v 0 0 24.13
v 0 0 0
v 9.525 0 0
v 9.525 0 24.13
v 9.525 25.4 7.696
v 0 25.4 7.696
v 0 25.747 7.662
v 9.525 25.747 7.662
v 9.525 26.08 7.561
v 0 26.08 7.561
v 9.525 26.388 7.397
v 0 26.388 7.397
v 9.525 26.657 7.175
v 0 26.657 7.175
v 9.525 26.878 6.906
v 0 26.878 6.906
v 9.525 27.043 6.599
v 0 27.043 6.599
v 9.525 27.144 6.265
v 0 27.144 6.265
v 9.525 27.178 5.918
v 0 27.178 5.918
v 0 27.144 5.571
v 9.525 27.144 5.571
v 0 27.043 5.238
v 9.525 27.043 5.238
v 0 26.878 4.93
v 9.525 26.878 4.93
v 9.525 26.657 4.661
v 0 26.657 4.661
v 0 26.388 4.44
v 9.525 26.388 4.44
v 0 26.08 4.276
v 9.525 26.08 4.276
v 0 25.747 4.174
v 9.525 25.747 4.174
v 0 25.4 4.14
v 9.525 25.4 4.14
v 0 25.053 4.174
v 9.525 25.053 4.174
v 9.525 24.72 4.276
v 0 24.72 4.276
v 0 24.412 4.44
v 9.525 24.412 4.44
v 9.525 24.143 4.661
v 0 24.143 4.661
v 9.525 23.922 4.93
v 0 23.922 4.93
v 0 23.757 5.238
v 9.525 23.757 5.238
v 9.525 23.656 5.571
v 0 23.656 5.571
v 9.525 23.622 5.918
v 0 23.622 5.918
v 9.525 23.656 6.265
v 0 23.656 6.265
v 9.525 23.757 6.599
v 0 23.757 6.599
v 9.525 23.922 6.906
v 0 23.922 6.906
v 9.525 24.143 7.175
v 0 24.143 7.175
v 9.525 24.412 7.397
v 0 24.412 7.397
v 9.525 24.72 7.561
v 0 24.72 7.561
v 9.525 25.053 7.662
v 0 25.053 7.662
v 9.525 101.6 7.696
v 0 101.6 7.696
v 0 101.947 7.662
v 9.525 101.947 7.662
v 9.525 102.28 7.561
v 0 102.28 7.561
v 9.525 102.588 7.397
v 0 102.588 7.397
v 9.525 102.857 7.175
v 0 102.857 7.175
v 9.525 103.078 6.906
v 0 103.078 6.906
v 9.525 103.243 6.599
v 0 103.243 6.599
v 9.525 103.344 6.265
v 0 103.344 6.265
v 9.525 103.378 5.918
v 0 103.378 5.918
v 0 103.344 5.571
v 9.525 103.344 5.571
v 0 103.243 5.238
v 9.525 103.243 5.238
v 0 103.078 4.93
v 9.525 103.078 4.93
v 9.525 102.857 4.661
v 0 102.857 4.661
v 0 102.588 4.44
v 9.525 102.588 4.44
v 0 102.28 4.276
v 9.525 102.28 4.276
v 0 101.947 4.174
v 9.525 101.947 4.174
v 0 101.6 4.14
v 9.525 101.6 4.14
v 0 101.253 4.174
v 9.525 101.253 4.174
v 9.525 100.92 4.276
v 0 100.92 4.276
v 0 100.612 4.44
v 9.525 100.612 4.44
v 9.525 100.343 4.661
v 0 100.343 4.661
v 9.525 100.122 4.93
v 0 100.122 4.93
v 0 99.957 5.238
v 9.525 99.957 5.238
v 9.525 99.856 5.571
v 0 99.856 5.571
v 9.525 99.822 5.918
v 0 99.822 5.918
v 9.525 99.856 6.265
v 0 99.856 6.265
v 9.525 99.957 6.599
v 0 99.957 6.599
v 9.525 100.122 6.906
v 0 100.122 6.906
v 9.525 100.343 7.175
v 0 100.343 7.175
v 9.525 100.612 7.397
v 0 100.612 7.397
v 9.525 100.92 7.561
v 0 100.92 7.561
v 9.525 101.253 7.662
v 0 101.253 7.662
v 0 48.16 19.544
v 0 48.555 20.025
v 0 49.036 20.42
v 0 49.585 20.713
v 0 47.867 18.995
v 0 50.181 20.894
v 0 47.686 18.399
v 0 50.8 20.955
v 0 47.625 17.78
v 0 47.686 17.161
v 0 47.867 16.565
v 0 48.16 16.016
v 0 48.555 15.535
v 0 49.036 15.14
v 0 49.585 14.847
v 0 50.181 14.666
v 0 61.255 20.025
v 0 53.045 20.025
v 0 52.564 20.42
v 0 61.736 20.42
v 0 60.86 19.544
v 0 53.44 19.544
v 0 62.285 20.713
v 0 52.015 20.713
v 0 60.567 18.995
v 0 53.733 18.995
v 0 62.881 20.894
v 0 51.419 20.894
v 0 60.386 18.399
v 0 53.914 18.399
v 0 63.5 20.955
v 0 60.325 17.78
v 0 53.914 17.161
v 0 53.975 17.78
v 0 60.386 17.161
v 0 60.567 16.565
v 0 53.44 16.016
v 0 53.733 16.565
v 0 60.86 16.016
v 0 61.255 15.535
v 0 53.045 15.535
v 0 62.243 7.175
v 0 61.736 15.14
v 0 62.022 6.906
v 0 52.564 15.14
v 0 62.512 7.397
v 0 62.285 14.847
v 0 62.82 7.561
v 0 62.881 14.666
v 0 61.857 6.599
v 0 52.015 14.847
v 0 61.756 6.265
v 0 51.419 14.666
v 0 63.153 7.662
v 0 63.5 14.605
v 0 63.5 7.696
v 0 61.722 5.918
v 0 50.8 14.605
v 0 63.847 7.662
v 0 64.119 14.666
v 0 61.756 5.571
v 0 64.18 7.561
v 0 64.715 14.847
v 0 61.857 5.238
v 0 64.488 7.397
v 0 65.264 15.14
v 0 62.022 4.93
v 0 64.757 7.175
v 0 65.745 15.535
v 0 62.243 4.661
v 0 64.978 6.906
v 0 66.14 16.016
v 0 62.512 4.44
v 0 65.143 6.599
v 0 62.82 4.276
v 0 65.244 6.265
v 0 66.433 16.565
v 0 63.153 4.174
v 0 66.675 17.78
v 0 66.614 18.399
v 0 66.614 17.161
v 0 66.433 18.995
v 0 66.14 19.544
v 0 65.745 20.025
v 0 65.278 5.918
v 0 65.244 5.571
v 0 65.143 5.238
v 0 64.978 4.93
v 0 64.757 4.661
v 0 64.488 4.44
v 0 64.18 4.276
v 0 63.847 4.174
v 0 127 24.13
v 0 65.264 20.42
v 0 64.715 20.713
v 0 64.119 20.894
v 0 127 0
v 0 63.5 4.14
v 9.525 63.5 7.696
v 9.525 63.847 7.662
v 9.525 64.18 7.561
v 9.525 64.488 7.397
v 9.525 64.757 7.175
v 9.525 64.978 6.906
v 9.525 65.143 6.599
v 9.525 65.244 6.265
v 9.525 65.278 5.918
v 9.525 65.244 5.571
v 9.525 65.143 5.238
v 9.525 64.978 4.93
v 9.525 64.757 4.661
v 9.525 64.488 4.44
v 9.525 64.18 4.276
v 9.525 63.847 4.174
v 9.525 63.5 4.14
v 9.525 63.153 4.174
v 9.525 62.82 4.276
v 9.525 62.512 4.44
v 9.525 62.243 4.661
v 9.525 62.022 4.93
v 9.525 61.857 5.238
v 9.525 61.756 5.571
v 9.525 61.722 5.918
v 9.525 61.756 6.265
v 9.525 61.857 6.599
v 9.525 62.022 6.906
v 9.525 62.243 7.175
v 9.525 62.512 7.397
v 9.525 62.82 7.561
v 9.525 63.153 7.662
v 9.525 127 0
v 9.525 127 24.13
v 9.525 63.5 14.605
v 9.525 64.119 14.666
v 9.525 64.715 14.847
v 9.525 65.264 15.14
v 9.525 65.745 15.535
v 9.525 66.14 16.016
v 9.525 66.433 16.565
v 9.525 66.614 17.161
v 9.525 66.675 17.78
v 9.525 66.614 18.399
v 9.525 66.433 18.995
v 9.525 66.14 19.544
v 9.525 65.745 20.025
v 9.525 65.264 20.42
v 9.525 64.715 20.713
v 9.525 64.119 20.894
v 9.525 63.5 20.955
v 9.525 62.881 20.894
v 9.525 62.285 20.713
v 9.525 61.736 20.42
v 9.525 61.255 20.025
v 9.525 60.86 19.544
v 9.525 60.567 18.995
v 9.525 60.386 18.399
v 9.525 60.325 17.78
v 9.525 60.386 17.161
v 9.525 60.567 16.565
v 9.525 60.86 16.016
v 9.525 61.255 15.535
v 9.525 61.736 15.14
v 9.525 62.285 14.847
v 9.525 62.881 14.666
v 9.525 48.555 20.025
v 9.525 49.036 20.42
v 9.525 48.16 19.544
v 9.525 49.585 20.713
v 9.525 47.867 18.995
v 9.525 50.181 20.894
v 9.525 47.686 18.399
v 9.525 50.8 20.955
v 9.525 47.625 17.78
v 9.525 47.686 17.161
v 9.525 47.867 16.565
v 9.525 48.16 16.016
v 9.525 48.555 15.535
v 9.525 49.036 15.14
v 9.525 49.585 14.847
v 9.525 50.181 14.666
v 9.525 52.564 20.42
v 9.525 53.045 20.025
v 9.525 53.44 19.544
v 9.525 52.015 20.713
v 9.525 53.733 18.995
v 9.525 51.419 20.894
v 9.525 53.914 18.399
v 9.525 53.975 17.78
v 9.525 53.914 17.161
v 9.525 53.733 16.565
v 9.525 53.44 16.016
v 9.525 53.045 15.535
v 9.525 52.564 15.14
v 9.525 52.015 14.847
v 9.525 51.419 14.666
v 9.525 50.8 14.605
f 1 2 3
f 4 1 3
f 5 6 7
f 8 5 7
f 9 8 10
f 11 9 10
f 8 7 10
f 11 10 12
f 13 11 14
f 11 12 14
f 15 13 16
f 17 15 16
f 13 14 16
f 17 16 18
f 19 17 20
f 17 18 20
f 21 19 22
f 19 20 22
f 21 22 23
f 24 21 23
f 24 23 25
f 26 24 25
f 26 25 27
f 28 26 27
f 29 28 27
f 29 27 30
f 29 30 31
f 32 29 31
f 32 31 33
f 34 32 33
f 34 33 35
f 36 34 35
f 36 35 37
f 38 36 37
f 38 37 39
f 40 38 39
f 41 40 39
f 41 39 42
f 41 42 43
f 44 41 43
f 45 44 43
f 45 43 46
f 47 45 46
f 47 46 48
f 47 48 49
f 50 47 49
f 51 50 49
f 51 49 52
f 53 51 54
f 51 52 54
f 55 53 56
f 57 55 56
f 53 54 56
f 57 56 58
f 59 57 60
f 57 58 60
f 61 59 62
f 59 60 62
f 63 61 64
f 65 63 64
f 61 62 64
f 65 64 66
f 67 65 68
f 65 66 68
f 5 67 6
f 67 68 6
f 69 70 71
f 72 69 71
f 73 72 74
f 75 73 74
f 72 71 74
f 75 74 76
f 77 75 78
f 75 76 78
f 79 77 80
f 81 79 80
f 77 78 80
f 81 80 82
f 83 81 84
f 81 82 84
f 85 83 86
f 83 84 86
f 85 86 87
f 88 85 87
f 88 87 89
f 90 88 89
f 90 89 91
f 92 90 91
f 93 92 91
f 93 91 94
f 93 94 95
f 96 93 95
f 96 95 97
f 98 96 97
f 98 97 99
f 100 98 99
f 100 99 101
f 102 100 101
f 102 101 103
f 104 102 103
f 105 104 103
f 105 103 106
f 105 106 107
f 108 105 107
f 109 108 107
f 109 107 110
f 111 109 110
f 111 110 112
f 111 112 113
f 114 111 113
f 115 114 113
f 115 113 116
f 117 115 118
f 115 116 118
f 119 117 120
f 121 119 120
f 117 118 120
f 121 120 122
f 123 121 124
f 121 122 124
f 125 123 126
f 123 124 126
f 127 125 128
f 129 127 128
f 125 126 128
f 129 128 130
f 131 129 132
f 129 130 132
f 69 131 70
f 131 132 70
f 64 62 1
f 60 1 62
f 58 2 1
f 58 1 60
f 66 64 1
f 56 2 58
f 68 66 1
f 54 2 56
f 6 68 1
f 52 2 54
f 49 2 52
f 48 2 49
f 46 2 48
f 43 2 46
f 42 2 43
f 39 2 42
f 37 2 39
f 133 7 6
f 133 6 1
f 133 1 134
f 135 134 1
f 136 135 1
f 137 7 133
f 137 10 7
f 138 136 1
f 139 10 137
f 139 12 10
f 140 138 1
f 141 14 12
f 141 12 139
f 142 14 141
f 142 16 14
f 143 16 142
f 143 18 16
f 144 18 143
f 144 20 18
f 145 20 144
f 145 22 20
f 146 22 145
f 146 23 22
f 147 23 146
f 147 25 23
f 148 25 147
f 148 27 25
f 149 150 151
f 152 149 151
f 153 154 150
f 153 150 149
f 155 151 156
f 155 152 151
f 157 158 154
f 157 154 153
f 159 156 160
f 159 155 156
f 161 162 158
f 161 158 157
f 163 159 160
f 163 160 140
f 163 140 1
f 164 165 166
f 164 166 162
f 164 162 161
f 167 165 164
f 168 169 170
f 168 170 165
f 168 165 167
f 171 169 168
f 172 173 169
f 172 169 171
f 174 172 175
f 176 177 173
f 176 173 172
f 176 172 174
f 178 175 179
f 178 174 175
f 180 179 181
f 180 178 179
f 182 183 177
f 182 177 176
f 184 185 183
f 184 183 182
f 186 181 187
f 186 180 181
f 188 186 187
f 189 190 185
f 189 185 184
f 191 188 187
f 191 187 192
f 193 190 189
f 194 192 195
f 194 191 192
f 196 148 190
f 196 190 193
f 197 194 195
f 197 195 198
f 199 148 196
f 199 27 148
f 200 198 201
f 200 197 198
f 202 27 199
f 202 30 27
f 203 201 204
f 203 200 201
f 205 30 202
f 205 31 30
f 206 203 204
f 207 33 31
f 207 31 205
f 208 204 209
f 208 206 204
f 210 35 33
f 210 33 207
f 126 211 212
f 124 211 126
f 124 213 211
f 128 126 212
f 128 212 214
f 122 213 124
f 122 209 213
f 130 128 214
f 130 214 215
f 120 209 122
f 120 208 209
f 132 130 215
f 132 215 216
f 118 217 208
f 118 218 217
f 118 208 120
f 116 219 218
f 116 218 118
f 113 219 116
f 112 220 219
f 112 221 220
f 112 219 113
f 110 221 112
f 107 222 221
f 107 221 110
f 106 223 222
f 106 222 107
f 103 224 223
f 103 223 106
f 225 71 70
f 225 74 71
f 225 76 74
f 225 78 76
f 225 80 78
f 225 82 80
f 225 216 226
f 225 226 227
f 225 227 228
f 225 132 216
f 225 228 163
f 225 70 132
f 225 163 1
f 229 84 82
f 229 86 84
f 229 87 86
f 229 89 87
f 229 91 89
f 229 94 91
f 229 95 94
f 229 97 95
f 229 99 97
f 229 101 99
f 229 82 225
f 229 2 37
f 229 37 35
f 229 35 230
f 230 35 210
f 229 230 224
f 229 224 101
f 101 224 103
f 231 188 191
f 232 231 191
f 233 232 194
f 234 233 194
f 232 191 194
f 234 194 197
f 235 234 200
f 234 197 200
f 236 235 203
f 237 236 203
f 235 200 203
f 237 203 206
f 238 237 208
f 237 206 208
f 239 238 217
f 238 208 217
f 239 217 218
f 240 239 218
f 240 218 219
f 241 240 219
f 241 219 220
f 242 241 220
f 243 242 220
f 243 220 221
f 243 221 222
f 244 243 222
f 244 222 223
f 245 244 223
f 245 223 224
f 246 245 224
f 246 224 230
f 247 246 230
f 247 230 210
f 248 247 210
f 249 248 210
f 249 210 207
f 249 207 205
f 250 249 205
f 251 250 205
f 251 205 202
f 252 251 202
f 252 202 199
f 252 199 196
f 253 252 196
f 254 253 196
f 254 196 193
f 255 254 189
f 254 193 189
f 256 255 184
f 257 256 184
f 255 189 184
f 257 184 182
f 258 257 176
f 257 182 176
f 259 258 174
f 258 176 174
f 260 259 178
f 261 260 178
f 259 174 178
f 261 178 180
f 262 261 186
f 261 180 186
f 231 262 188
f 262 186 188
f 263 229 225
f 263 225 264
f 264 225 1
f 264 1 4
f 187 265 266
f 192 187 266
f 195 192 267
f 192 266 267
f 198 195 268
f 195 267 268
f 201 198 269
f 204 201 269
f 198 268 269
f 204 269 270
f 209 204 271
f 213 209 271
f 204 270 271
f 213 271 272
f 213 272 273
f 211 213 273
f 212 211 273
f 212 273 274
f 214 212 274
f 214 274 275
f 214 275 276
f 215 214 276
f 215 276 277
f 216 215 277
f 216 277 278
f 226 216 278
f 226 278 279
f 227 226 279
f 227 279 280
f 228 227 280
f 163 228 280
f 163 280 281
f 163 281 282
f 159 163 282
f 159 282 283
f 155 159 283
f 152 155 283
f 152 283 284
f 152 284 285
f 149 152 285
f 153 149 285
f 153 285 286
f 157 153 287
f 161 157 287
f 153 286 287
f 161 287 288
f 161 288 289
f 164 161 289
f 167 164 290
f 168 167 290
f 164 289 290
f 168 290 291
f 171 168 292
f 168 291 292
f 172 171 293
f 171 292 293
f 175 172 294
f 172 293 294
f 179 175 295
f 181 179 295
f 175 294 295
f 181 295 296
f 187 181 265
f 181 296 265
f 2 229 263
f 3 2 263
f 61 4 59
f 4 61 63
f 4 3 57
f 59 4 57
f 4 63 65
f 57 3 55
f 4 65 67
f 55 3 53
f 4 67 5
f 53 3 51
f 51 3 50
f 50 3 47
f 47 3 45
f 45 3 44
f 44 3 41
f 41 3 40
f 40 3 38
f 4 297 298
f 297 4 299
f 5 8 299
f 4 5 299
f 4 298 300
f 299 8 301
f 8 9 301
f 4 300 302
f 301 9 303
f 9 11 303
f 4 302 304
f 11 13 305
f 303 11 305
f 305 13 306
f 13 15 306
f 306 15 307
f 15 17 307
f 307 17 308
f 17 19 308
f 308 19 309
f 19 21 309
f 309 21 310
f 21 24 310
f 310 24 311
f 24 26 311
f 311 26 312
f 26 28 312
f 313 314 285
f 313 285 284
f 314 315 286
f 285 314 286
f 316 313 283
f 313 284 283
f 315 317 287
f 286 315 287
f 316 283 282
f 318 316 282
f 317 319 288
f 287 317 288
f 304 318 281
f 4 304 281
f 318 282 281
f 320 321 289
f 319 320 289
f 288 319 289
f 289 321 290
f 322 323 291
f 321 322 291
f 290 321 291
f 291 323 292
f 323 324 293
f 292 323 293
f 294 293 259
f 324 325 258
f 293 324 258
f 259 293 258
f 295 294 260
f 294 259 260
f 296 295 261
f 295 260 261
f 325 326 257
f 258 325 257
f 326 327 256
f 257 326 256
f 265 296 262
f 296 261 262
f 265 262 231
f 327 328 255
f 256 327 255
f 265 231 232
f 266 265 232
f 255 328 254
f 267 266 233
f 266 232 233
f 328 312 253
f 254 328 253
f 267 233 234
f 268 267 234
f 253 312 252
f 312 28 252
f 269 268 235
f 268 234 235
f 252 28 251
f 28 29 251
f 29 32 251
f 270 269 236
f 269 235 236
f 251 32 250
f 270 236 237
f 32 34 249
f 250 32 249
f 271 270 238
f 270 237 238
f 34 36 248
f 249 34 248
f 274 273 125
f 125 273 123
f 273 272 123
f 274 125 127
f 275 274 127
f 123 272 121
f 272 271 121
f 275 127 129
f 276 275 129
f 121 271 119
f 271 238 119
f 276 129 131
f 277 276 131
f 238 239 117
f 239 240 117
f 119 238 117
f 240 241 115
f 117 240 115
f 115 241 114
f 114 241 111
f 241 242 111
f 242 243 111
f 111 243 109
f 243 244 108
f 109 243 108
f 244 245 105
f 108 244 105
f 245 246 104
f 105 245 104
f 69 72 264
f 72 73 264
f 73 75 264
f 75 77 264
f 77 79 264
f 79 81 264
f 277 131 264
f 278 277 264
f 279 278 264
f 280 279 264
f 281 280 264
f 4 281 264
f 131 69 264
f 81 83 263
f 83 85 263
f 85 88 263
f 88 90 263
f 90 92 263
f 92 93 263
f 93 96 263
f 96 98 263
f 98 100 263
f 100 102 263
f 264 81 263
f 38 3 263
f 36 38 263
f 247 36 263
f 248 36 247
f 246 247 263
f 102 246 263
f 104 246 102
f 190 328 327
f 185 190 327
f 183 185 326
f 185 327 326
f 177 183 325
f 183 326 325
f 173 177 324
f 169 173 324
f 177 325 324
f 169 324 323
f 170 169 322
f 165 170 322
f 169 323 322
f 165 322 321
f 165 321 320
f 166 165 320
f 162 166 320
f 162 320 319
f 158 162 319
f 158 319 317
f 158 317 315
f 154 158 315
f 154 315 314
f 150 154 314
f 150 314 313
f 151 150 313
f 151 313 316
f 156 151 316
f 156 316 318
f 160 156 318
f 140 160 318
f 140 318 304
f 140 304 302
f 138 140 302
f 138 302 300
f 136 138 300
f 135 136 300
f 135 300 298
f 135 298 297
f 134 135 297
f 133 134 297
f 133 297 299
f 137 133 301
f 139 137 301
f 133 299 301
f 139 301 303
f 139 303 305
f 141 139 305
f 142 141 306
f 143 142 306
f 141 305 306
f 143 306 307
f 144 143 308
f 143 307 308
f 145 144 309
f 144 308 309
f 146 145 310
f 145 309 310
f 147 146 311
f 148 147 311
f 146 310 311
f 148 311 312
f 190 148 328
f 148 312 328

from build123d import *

# Parameters (mm, degrees)
SKETCH1_W           = 9.525
SKETCH1_H           = 127
BOSS_EXTRUDE1_DEPTH = 24.13
SKETCH2_R           = 1.778
CUT_EXTRUDE1_DEPTH  = 10.525
SKETCH3_R           = 3.175
CUT_EXTRUDE2_DEPTH  = 38.1


with BuildPart() as part:
    # Sketch1 → Boss-Extrude1 (new body)
    with BuildSketch(Plane.XY):
        with Locations((4.7625, 63.5)):
            Rectangle(SKETCH1_W, SKETCH1_H)
    extrude(amount=BOSS_EXTRUDE1_DEPTH)

    # Sketch2 → Cut-Extrude1 (cut, through all)
    with BuildSketch(Plane.ZY):
        with Locations((5.9182, 101.6)):
            Circle(SKETCH2_R)
        with Locations((5.9182, 63.5)):
            Circle(SKETCH2_R)
        with Locations((5.9182, 25.4)):
            Circle(SKETCH2_R)
    extrude(amount=-CUT_EXTRUDE1_DEPTH, mode=Mode.SUBTRACT)

    # Sketch3 → Cut-Extrude2 (cut)
    with BuildSketch(Plane(origin=(9.525, 0, 0), x_dir=(0, 0, -1), z_dir=(1, 0, 0))):
        with Locations((-17.78, 63.5)):
            Circle(SKETCH3_R)
        with Locations((-17.78, 50.8)):
            Circle(SKETCH3_R)
    extrude(amount=-CUT_EXTRUDE2_DEPTH, mode=Mode.SUBTRACT)


solid = part.part
